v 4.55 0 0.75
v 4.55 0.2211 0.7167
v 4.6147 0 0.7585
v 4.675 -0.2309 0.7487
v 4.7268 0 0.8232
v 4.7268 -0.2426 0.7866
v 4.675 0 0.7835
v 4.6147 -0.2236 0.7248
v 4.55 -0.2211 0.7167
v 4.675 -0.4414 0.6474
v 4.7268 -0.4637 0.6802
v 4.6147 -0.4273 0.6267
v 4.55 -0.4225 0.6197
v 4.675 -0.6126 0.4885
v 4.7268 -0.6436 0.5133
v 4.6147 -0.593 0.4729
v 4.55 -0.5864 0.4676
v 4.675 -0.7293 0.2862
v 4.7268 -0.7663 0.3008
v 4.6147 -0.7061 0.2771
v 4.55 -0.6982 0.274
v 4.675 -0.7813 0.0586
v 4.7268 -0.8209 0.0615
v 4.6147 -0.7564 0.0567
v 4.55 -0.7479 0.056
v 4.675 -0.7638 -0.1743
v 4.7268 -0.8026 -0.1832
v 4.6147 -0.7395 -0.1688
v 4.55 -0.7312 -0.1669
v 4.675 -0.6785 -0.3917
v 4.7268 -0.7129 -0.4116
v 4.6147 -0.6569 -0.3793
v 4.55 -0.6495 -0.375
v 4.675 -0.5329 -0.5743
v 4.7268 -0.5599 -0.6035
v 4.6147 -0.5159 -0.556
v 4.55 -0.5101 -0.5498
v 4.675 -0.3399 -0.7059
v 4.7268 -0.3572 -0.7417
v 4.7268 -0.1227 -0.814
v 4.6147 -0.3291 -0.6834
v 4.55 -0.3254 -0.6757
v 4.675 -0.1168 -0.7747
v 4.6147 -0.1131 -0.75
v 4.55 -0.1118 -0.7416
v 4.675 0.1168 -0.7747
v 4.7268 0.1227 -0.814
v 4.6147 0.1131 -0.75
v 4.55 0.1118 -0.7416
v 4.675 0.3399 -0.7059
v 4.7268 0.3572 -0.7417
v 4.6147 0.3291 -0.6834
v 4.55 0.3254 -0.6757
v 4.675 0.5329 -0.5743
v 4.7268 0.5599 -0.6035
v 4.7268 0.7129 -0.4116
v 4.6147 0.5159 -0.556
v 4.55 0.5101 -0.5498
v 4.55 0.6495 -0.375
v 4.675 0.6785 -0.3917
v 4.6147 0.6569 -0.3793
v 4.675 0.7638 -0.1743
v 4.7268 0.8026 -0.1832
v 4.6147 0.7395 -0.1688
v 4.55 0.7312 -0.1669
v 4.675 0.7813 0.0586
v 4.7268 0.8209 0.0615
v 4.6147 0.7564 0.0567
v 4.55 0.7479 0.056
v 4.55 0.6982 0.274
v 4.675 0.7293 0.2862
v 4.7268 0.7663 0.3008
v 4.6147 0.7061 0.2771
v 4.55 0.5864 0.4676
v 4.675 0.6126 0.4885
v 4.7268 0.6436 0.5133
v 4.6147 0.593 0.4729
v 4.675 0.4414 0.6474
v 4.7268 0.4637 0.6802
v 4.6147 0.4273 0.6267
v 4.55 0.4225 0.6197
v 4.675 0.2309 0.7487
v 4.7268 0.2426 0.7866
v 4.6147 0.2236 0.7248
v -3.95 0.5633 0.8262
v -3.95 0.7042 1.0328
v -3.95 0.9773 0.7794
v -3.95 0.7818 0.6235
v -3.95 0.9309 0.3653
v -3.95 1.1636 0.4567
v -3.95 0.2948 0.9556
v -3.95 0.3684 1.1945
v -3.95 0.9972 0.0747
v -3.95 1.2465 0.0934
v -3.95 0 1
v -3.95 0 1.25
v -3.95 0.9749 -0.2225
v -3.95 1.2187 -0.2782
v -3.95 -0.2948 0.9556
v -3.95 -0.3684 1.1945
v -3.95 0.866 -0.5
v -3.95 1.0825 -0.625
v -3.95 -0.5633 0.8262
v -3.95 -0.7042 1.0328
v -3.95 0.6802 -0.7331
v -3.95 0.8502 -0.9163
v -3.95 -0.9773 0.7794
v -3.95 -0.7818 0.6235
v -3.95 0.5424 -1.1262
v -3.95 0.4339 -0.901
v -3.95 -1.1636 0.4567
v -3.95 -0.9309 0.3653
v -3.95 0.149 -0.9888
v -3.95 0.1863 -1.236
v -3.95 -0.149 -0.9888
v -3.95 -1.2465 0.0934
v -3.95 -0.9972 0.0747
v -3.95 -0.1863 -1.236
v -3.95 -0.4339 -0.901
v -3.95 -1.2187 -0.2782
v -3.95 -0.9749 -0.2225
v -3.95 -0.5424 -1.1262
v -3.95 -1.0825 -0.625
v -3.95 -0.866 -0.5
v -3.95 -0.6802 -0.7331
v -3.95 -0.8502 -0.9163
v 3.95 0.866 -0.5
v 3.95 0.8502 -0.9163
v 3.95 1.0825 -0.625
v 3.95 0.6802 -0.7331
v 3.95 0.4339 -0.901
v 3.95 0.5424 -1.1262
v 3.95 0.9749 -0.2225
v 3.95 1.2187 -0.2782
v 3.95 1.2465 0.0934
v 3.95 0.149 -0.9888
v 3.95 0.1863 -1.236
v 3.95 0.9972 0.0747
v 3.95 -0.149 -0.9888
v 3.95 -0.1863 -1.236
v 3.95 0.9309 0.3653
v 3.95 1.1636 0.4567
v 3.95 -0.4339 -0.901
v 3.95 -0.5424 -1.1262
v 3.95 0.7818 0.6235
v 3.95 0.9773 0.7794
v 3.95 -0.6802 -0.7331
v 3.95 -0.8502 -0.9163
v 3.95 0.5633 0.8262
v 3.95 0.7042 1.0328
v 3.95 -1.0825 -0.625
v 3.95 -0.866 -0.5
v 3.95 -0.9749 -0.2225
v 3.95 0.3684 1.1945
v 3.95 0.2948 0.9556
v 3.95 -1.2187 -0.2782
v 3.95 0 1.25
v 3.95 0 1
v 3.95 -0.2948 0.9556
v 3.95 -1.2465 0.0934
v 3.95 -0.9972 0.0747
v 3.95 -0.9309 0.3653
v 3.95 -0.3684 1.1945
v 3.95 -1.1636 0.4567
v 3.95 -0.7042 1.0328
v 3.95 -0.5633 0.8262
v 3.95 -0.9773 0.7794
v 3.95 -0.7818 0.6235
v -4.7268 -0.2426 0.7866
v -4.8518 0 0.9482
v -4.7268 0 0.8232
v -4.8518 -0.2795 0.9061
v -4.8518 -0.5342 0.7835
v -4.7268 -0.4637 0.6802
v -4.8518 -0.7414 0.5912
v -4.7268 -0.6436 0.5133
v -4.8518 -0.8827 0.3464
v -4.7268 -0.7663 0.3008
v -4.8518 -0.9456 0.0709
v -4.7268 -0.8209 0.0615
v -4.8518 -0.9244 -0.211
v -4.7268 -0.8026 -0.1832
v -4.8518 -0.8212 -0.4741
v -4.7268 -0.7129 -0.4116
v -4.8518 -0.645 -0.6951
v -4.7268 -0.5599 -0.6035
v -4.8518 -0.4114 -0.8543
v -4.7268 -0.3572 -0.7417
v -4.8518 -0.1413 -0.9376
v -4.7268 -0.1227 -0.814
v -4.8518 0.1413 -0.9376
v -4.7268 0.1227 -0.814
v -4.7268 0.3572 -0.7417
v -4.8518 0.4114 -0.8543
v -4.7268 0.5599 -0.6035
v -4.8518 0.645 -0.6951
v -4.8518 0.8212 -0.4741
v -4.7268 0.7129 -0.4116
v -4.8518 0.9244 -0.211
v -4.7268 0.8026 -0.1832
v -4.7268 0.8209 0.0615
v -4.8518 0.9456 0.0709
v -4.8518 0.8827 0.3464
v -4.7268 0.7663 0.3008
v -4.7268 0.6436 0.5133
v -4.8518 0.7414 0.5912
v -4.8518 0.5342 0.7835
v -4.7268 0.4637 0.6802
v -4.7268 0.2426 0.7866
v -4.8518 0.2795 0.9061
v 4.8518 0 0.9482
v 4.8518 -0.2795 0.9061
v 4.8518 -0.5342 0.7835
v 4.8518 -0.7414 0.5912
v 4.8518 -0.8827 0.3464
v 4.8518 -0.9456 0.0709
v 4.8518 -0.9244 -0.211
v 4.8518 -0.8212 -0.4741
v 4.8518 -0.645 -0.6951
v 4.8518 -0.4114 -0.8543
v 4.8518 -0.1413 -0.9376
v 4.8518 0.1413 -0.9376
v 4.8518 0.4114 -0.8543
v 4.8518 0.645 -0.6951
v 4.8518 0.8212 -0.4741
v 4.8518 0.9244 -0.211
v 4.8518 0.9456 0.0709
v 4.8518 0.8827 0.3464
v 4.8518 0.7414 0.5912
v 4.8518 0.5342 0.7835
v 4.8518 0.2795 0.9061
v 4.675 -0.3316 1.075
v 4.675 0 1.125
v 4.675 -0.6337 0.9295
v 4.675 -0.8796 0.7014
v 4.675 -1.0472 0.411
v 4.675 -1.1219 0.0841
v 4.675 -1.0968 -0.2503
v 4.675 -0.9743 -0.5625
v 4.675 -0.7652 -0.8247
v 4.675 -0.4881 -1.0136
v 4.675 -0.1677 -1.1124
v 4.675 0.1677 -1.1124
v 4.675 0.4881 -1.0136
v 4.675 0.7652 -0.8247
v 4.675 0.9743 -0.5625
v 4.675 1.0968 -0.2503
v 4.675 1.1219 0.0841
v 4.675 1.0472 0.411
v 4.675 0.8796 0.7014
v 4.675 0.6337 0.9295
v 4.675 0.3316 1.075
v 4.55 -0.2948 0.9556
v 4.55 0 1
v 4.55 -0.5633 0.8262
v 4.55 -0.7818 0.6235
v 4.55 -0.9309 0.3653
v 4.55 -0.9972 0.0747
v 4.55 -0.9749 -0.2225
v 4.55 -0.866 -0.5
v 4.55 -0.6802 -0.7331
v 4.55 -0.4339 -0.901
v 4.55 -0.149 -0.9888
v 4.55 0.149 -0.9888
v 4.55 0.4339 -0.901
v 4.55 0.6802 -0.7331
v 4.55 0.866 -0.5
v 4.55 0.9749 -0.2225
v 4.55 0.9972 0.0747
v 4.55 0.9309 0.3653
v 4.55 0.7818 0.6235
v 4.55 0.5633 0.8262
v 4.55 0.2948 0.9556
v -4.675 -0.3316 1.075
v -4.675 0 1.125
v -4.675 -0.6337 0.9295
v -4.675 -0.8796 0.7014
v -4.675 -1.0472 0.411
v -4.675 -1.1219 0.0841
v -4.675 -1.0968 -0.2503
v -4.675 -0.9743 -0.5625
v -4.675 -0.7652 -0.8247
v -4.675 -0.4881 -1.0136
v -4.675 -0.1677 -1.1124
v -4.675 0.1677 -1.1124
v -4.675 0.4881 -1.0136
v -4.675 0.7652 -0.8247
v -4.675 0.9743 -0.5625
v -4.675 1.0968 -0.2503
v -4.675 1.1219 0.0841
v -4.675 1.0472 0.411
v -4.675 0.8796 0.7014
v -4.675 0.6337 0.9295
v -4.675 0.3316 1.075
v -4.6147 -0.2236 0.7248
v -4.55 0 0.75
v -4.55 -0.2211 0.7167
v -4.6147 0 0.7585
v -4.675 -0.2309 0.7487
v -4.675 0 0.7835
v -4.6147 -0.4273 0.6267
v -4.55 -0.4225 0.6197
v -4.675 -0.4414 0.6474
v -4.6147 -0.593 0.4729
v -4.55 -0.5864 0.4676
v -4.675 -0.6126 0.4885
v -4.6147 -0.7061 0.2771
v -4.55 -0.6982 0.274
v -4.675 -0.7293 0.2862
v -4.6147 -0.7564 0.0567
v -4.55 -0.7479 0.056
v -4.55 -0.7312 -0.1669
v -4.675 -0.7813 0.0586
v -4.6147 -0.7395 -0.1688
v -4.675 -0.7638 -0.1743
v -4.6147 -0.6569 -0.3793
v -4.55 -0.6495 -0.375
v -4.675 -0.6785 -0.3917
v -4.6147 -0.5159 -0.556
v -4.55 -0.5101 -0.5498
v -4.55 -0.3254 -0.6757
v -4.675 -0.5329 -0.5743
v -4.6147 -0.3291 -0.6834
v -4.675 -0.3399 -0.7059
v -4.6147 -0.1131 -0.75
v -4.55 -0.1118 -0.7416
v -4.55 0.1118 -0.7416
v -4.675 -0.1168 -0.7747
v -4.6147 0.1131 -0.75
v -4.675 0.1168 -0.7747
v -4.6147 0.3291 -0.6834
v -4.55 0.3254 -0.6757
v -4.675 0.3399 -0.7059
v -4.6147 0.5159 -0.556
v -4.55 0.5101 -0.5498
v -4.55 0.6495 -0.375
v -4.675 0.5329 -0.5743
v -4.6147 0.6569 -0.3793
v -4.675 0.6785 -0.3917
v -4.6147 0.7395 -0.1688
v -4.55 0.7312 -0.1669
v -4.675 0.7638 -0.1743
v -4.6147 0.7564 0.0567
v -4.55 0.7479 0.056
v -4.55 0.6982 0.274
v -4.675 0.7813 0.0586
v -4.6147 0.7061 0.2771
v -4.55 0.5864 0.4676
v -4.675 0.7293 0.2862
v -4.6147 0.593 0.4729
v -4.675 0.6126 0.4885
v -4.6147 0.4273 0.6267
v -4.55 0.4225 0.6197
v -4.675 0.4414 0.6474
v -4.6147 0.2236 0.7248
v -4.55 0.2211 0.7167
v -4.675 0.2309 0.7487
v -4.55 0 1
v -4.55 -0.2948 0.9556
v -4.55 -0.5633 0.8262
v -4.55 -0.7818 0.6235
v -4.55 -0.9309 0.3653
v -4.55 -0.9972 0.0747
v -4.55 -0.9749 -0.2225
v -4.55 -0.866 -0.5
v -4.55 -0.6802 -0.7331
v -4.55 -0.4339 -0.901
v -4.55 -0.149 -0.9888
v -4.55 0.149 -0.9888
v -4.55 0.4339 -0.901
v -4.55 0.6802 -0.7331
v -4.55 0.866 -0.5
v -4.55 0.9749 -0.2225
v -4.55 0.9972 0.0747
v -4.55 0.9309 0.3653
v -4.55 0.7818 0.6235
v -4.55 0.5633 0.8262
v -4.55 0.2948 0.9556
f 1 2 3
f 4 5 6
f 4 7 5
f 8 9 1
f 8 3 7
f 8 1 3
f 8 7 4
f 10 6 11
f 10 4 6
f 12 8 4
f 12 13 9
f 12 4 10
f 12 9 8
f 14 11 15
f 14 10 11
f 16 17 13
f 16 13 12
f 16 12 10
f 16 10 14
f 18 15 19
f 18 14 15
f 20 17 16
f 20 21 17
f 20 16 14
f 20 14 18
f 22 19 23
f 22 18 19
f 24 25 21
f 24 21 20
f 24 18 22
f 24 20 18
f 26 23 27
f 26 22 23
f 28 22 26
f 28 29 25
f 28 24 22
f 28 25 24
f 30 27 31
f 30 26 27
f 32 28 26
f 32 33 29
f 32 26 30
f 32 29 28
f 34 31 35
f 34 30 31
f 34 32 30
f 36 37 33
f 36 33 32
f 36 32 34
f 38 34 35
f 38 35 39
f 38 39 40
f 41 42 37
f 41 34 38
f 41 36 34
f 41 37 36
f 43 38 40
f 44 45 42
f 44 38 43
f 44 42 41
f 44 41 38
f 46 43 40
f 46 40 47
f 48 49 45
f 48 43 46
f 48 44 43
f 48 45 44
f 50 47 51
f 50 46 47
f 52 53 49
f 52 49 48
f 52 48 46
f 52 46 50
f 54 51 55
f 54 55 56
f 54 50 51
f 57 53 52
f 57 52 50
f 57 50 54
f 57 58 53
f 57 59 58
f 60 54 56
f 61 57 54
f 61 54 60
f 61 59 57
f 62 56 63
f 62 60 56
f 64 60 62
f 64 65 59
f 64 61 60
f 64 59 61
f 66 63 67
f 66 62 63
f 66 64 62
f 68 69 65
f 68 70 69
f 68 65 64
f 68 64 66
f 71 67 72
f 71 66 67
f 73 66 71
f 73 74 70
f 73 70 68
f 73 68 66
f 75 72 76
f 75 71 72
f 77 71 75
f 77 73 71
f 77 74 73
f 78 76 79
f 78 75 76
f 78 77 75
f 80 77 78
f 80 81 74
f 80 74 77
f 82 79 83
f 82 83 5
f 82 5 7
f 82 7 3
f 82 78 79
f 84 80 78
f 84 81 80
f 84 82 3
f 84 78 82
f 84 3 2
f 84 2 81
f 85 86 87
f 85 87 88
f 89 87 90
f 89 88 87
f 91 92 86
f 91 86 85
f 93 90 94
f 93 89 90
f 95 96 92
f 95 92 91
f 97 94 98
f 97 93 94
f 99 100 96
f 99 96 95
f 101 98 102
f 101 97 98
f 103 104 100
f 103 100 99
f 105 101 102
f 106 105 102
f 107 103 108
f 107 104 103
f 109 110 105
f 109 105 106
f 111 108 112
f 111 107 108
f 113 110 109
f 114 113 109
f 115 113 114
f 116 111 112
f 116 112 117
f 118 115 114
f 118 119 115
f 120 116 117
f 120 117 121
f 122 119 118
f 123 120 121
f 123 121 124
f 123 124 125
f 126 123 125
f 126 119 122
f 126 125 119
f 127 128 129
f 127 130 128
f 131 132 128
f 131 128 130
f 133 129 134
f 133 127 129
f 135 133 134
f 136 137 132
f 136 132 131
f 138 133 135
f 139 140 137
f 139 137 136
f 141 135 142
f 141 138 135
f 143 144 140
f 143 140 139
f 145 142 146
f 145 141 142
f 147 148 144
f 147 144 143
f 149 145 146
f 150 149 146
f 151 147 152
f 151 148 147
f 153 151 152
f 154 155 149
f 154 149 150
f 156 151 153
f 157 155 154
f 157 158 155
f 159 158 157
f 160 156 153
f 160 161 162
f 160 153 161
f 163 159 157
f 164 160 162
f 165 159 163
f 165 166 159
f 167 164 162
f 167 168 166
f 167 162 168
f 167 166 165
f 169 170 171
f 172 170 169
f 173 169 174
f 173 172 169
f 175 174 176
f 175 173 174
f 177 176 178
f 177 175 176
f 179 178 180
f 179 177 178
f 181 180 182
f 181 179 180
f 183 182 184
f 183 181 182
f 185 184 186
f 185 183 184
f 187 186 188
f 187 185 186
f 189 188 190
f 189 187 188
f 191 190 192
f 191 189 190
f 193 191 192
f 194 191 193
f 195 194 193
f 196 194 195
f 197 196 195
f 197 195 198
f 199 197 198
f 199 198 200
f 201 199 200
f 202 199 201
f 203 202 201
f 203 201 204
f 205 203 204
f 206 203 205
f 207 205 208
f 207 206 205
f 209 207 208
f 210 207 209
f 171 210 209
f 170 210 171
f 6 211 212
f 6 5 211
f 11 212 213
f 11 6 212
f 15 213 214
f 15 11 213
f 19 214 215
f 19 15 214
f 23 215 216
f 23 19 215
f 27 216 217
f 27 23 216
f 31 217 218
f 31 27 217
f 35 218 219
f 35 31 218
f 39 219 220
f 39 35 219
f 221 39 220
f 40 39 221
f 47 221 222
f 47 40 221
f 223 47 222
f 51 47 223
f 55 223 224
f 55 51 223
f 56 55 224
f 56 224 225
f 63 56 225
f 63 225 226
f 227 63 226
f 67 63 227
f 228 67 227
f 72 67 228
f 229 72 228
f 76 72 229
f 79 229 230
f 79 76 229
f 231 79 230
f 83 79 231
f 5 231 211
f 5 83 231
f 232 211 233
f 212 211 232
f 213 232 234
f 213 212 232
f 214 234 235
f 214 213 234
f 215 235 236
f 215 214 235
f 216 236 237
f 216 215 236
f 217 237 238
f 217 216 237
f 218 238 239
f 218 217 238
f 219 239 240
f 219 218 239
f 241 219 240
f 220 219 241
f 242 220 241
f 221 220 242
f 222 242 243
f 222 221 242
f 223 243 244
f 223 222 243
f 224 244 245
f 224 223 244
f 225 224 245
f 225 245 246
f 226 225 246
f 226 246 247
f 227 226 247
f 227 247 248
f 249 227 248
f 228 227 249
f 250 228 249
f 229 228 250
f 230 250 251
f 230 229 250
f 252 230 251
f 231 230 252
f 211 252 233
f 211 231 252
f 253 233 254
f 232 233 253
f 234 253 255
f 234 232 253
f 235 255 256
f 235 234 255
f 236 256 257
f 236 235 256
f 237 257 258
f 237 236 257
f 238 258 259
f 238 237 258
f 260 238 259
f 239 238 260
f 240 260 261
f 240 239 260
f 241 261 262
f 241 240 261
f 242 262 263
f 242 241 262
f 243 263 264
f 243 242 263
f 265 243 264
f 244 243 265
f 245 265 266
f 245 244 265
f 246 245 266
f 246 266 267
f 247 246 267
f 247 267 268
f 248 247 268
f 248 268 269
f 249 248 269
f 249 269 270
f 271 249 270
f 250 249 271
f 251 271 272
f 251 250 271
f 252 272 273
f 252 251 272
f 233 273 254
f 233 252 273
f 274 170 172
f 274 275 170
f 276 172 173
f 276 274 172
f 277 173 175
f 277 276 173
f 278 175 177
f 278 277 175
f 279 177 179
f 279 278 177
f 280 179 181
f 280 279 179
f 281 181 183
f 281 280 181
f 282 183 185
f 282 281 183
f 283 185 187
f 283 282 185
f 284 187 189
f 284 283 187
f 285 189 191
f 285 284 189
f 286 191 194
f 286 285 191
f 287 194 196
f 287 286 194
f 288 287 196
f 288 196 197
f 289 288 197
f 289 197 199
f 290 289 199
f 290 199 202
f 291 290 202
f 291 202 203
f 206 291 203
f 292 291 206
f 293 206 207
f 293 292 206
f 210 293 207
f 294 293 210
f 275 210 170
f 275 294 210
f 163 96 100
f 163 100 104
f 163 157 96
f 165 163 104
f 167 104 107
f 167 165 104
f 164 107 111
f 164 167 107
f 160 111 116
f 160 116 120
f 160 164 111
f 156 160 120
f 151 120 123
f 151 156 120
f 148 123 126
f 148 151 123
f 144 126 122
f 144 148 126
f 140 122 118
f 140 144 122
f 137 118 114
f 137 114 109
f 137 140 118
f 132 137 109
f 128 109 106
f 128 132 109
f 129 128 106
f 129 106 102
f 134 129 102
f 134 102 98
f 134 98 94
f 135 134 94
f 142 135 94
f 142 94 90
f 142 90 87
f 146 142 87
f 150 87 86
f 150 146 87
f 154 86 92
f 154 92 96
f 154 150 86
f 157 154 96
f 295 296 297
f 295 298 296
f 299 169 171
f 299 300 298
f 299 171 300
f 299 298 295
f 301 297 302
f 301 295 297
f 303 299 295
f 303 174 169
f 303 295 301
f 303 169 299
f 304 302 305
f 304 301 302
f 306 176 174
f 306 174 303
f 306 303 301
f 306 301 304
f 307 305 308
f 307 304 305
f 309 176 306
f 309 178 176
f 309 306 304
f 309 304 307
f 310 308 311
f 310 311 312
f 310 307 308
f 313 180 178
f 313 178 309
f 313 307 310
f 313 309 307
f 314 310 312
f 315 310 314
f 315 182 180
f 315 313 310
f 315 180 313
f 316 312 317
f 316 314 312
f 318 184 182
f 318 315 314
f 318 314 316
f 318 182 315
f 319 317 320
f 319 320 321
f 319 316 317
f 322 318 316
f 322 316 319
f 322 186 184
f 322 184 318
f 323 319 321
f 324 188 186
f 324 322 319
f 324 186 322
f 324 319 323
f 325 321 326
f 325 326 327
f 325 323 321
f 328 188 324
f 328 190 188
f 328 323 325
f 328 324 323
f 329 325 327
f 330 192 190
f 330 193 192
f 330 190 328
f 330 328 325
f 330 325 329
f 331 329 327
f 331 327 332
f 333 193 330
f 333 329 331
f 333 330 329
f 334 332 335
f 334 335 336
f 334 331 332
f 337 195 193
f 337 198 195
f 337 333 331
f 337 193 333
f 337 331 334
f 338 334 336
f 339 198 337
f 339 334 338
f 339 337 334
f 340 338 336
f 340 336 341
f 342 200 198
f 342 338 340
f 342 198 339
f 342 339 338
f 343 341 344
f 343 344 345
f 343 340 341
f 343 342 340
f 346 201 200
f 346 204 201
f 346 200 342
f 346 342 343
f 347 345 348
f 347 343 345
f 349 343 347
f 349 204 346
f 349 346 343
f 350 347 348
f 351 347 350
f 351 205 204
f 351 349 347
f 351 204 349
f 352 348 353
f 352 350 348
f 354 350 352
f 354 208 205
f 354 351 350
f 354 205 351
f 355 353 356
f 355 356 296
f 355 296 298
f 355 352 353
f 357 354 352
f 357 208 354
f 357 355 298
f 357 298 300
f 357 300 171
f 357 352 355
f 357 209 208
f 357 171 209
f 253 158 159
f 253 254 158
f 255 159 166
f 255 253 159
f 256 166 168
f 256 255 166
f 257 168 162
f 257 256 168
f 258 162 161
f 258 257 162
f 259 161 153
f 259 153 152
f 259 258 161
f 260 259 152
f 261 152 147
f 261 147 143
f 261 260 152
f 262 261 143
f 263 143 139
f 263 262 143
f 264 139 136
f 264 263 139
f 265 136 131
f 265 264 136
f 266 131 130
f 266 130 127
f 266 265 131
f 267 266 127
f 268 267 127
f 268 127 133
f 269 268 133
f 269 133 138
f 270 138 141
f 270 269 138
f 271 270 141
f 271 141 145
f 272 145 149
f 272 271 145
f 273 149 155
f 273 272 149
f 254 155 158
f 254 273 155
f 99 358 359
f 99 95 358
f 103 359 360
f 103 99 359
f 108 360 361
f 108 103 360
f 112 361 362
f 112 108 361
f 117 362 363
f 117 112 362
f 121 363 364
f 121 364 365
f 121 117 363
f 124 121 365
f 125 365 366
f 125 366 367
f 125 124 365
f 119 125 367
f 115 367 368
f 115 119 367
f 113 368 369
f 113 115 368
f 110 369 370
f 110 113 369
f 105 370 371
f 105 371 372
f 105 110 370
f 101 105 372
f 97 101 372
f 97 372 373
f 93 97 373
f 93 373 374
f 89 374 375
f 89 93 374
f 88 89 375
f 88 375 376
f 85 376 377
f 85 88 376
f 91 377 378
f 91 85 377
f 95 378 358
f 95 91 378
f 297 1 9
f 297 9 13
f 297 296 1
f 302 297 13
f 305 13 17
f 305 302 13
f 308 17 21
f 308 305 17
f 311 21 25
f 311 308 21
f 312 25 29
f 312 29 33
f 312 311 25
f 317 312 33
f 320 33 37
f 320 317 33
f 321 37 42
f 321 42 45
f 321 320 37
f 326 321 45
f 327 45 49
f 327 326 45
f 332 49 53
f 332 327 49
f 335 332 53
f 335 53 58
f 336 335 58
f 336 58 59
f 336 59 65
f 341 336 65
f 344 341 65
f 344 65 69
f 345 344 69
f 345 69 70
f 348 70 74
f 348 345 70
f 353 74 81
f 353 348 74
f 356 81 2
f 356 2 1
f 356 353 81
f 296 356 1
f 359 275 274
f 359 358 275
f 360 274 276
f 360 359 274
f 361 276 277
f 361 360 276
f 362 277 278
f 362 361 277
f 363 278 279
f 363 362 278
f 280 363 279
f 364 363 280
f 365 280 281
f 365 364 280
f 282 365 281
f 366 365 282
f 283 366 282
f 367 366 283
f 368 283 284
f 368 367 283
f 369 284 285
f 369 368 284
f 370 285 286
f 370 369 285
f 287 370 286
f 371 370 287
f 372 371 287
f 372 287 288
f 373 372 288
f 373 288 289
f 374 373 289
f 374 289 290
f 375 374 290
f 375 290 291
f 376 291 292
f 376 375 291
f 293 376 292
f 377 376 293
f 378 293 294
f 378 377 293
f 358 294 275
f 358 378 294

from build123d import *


with BuildPart() as part:
    # Sketch1 → Revolve1 (revolve)
    with BuildSketch(Plane.XY, mode=Mode.PRIVATE) as revolve1_sk:
        with BuildLine():
            Line((-3.95, 1.25), (3.95, 1.25))
            Line((3.95, 1.25), (3.95, 1))
            Line((3.95, 1), (4.55, 1))
            Line((4.55, 1), (4.675, 1.125))
            Line((4.675, 1.125), (4.851776695, 0.948223305))
            Line((4.851776695, 0.948223305), (4.726776695, 0.823223305))
            ThreePointArc((4.726776695, 0.823223305), (4.645670858, 0.769030117), (4.55, 0.75))
            Line((4.55, 0.75), (-4.55, 0.75))
            ThreePointArc((-4.55, 0.75), (-4.645670858, 0.769030117), (-4.726776695, 0.823223305))
            Line((-4.726776695, 0.823223305), (-4.851776695, 0.948223305))
            Line((-4.851776695, 0.948223305), (-4.675, 1.125))
            Line((-4.675, 1.125), (-4.55, 1))
            Line((-4.55, 1), (-3.95, 1))
            Line((-3.95, 1), (-3.95, 1.25))
        make_face()
    revolve(revolve1_sk.sketch.rotate(Axis((-108.445306304, 0, 0), (1, 0, 0)), 90), axis=Axis((-108.445306304, 0, 0), (1, 0, 0)))


solid = part.part
